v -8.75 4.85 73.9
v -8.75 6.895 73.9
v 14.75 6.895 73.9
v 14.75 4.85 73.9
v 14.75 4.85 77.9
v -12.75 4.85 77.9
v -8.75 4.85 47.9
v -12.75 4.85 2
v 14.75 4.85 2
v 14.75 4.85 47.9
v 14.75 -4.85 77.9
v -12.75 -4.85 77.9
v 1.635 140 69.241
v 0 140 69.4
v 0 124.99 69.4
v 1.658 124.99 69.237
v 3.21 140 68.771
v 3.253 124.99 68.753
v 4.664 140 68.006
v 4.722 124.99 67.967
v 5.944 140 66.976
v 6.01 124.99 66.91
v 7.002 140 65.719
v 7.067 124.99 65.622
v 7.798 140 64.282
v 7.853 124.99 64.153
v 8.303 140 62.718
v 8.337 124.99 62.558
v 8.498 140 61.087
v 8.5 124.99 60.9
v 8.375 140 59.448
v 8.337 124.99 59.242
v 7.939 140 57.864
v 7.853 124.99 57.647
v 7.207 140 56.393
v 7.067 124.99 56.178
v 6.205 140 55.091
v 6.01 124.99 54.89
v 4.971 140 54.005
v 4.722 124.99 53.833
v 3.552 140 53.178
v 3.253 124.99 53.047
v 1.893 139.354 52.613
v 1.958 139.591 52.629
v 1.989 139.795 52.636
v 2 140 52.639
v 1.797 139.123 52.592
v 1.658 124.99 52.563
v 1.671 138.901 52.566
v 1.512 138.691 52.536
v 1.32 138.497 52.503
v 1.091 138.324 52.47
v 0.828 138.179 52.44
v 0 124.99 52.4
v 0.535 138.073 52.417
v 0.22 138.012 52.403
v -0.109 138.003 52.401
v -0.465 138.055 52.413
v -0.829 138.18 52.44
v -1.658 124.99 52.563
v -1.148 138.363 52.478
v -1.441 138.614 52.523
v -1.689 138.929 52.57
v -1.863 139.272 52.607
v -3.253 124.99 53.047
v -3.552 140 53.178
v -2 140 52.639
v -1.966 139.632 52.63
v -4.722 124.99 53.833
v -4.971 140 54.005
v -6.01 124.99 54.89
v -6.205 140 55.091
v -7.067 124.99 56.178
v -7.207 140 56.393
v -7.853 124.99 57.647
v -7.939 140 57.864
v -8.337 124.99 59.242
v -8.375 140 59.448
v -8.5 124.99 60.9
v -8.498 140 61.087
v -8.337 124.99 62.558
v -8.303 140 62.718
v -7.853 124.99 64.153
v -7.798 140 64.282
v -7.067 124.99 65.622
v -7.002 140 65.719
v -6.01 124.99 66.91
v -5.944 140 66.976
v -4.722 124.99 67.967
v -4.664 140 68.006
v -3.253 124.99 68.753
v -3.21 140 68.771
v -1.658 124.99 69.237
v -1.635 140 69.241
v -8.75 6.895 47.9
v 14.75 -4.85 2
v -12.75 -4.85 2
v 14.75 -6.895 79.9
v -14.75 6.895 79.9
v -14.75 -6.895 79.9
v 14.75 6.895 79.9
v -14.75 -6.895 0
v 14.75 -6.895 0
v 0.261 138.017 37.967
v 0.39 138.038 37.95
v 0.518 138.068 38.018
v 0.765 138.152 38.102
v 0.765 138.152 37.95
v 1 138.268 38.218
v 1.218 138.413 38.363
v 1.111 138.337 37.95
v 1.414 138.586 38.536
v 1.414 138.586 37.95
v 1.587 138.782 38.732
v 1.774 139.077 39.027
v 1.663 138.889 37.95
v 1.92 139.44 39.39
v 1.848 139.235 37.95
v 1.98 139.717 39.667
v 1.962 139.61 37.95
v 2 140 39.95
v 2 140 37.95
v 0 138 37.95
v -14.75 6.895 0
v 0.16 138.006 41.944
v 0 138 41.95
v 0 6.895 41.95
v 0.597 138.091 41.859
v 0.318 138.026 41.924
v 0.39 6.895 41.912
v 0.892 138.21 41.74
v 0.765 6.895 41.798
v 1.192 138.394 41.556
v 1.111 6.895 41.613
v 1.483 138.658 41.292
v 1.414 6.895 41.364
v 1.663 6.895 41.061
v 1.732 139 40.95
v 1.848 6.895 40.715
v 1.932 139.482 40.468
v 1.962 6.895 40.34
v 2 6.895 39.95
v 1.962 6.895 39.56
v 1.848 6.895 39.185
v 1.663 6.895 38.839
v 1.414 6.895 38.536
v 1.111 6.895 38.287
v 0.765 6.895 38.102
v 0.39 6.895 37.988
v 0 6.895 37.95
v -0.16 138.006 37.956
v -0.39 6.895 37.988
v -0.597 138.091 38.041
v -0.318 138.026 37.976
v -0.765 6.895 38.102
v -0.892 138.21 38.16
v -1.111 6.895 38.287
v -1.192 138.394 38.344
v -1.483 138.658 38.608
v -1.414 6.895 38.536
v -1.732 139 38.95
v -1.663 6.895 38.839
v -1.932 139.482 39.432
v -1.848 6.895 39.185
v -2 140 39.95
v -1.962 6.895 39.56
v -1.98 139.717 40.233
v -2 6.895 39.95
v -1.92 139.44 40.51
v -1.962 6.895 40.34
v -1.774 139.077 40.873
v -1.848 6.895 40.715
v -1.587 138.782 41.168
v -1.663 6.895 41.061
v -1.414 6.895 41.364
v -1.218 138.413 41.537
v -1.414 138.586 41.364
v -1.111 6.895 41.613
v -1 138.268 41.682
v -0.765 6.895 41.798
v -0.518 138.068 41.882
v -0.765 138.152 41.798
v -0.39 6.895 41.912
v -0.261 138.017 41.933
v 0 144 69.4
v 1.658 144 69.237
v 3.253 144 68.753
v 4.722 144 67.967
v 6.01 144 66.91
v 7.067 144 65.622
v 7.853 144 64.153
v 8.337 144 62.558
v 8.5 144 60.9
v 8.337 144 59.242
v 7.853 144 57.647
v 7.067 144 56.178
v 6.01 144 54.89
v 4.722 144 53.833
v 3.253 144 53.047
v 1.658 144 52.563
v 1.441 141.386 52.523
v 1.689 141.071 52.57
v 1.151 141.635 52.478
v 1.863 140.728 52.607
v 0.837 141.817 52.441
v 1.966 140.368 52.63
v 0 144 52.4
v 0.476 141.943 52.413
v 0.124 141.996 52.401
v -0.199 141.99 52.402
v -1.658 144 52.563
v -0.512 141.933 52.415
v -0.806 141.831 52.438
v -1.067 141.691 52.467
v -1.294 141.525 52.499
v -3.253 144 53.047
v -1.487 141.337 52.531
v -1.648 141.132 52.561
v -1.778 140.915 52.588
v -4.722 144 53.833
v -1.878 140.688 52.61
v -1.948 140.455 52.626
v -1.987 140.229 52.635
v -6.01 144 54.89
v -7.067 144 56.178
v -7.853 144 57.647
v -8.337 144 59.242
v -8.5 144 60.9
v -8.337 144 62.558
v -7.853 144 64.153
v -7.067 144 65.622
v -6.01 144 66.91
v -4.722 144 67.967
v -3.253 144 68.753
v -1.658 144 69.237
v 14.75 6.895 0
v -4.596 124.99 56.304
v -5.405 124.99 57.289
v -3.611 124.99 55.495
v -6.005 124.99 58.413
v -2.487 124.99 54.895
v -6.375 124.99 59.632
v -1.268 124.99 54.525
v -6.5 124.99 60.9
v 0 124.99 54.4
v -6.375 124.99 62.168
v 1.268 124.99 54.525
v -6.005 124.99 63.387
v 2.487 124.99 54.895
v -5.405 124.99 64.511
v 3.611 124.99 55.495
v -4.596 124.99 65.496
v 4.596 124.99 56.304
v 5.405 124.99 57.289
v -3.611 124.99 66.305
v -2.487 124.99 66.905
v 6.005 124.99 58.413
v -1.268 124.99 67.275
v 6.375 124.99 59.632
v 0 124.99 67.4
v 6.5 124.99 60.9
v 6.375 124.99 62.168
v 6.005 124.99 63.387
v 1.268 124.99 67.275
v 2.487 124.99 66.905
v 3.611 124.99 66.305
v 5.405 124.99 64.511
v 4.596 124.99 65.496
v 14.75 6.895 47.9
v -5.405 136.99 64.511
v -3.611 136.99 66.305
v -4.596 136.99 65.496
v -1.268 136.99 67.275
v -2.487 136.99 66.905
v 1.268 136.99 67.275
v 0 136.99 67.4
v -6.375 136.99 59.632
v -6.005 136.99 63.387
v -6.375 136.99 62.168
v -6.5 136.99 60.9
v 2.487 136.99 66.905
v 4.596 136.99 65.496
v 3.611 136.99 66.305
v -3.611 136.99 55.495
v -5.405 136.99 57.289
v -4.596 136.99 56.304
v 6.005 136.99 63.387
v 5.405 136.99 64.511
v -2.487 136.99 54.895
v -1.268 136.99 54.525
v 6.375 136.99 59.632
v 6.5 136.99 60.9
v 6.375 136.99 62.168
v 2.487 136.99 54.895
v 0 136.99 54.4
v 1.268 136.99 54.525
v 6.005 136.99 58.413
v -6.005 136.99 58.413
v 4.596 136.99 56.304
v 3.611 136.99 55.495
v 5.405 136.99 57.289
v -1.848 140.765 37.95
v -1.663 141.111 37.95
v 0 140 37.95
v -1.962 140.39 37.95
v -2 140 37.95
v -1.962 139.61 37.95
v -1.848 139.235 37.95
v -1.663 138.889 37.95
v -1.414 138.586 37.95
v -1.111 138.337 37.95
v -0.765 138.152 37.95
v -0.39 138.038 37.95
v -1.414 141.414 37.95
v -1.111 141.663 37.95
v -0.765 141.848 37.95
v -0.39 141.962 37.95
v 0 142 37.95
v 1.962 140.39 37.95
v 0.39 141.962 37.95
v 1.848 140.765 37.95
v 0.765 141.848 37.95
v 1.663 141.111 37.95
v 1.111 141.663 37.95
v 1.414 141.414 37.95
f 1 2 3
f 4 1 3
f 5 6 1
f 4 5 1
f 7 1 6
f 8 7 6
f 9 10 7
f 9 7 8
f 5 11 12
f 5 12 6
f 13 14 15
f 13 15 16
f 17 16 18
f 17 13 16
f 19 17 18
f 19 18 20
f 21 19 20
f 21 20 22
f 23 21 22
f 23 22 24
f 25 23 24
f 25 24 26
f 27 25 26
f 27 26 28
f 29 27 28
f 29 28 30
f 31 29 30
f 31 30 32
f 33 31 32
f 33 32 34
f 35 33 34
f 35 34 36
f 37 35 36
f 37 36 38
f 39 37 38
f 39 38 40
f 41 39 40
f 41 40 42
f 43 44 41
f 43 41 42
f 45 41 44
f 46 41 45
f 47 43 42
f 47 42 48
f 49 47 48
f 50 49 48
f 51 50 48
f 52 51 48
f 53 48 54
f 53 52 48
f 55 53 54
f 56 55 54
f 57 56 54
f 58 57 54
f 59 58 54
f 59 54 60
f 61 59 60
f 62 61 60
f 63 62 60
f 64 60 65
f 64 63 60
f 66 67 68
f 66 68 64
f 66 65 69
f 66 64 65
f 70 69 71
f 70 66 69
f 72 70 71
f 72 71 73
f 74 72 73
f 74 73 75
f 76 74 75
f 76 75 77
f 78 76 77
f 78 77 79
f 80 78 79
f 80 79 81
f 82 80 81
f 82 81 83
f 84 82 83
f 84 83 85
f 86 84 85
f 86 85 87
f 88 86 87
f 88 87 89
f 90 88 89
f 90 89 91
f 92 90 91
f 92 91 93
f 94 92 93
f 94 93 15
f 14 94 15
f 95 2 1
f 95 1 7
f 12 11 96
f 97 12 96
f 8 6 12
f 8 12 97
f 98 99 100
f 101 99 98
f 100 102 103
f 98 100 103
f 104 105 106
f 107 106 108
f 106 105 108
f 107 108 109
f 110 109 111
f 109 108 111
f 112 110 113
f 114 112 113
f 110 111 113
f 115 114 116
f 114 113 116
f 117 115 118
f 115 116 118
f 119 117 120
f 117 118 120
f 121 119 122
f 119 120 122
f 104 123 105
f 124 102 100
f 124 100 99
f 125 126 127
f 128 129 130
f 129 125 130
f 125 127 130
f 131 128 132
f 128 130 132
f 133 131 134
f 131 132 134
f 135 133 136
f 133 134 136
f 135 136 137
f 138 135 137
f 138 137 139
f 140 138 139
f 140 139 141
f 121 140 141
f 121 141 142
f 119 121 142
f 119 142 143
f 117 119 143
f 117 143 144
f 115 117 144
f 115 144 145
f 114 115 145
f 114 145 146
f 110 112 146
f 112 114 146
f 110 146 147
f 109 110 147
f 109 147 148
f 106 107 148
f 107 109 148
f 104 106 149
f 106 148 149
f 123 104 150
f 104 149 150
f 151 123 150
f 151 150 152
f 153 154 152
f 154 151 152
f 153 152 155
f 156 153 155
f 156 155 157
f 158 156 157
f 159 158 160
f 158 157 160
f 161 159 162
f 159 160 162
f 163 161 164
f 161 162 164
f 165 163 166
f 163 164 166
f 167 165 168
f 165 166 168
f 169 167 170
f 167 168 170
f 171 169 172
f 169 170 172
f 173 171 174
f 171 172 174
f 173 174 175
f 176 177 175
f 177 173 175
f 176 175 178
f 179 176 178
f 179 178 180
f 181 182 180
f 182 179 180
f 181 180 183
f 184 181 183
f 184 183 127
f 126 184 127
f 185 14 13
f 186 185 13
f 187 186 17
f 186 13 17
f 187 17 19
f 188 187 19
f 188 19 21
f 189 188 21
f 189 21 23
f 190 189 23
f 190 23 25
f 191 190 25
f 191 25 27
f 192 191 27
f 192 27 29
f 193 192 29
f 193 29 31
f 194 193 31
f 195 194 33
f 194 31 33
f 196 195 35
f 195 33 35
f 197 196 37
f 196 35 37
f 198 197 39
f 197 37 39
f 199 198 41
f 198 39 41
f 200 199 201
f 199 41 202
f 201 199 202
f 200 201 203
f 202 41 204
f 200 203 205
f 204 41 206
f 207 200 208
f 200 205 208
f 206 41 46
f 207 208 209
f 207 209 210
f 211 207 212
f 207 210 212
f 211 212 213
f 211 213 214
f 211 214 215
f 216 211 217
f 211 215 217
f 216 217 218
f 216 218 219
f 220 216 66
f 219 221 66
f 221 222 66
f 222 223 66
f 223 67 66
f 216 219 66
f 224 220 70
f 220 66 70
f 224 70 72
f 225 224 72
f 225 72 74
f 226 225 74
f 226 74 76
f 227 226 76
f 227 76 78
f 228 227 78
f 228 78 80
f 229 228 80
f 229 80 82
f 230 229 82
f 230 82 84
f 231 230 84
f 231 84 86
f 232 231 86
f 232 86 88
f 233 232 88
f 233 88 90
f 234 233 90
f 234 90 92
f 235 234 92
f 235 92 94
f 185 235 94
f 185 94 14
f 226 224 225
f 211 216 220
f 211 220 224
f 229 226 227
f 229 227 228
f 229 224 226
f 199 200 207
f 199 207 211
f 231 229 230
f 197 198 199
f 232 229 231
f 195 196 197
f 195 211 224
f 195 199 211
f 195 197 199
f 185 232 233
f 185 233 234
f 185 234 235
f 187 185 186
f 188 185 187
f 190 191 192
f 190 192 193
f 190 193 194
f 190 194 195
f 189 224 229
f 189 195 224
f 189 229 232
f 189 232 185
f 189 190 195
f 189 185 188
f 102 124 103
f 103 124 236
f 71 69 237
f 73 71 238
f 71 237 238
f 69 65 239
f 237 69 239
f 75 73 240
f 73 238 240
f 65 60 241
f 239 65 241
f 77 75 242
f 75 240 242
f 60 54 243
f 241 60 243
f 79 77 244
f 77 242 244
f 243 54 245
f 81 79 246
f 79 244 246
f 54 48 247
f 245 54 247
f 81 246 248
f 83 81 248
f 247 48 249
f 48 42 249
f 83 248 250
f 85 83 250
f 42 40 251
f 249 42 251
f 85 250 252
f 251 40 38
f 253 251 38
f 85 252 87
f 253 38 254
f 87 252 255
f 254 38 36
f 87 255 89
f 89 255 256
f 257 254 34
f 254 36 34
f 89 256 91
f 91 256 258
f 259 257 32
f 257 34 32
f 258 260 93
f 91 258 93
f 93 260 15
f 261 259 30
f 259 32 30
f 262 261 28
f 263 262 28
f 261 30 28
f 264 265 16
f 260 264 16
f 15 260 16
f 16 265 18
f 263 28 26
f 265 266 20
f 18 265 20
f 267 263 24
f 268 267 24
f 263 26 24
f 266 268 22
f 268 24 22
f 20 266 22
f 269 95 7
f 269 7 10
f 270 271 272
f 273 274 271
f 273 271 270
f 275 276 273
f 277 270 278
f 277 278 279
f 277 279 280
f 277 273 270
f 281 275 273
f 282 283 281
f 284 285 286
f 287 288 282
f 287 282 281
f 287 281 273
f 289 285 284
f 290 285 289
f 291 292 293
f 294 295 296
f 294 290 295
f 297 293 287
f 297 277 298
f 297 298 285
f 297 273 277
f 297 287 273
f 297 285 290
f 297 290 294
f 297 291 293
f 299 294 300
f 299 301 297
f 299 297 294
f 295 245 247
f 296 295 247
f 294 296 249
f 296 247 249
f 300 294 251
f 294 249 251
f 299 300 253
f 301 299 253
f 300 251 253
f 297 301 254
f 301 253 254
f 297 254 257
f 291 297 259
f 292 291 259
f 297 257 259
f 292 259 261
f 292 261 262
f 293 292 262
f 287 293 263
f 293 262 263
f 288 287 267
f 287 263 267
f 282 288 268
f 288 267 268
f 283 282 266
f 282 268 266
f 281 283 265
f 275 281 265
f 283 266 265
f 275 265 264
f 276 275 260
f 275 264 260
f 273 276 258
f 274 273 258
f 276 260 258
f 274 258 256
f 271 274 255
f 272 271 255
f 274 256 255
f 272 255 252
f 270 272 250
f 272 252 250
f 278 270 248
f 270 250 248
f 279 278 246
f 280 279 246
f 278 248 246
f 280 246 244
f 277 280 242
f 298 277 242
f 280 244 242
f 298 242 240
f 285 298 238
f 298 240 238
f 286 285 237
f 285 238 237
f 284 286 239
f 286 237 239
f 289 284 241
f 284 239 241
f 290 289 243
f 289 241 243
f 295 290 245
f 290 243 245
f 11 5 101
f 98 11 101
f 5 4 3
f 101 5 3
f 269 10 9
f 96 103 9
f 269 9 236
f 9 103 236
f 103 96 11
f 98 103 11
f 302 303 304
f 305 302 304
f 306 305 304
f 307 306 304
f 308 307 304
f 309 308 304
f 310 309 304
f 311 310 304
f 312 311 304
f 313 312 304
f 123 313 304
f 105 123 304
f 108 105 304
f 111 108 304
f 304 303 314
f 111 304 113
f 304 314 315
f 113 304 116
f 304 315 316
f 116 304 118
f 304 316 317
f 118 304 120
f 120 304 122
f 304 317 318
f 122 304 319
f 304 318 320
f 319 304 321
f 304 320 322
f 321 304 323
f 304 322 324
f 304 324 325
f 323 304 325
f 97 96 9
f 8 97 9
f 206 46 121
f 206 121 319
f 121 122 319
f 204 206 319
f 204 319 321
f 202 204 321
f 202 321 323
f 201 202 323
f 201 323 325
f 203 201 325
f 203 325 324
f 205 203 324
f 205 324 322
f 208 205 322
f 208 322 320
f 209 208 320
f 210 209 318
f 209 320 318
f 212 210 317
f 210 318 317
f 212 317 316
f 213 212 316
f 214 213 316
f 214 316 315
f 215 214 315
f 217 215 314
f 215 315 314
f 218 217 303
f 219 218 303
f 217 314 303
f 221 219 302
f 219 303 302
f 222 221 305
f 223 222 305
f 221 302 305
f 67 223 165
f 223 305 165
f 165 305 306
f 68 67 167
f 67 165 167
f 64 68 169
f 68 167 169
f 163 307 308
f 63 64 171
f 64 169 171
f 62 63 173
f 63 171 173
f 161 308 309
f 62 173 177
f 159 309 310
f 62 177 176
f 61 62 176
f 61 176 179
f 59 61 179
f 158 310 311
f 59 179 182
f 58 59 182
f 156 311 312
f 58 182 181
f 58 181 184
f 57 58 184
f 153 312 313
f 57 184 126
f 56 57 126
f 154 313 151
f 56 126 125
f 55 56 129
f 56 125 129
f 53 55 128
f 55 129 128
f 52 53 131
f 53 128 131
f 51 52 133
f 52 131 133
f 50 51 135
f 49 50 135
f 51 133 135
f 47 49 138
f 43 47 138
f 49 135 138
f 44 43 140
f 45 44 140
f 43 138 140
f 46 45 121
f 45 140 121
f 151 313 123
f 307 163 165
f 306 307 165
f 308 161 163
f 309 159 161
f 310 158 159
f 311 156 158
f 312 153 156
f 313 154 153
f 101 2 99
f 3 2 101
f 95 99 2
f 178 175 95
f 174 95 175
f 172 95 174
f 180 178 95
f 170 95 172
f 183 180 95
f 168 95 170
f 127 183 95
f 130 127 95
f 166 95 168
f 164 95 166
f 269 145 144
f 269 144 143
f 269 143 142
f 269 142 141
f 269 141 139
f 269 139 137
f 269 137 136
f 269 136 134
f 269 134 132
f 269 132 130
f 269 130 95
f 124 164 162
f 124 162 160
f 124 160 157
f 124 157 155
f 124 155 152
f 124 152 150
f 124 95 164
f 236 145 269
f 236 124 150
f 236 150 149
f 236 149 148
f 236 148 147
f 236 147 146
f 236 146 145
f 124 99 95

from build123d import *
from build123d.topology import SkipClean

# Parameters (mm, degrees)
SKETCH4_R           = 2
BOSS_EXTRUDE1_DEPTH = 140
SKETCH5_W           = 29.5
SKETCH5_H           = 13.79
BOSS_EXTRUDE3_DEPTH = 79.9
SKETCH6_W           = 75.9
SKETCH6_H           = 9.7
CUT_EXTRUDE1_DEPTH  = 27.5
SKETCH7_W           = 23.5
SKETCH7_H           = 26
CUT_EXTRUDE2_DEPTH  = 3
SKETCH8_R           = 2
BOSS_EXTRUDE4_DEPTH = 22.95
SKETCH12_R          = 8.5
BOSS_EXTRUDE6_DEPTH = 15.01
SKETCH13_R          = 8.5
BOSS_EXTRUDE7_DEPTH = 4
SKETCH14_R          = 6.5
CUT_EXTRUDE3_DEPTH  = 12


with BuildPart() as part:
    # Sketch4 → Boss-Extrude1 (new body)
    with BuildSketch(Plane(origin=(0, 0, 0), x_dir=(1, 0, 0), z_dir=(0, 1, 0))):
        with Locations(Location((0, -39.95, 0), (0, 0, 270))):
            Circle(SKETCH4_R)
    extrude(amount=BOSS_EXTRUDE1_DEPTH)

    # Sketch5 → Boss-Extrude3 (add)
    with BuildSketch(Plane.XY):
        Rectangle(SKETCH5_W, SKETCH5_H)
    extrude(amount=BOSS_EXTRUDE3_DEPTH)

    # Sketch6 → Cut-Extrude1 (cut)
    with BuildSketch(Plane(origin=(14.75, 0, 0), x_dir=(0, 0, -1), z_dir=(1, 0, 0))):
        with Locations((-39.95, 0)):
            Rectangle(SKETCH6_W, SKETCH6_H)
    extrude(amount=-CUT_EXTRUDE1_DEPTH, mode=Mode.SUBTRACT)

    # Sketch7 → Cut-Extrude2 (cut)
    with BuildSketch(Plane(origin=(0, 6.895, 0), x_dir=(1, 0, 0), z_dir=(0, 1, 0))):
        with Locations((3, -60.9)):
            Rectangle(SKETCH7_W, SKETCH7_H)
    extrude(amount=-CUT_EXTRUDE2_DEPTH, mode=Mode.SUBTRACT)

    # Sketch8 → Boss-Extrude4 (add)
    with SkipClean():  # the faces are left unmerged after this step: merging them gives an invalid solid
        with BuildSketch(Plane.XY.offset(37.95)):
            with Locations((0, 140)):
                Circle(SKETCH8_R)
        extrude(amount=BOSS_EXTRUDE4_DEPTH)

    # Sketch12 → Boss-Extrude6 (add)
    with SkipClean():  # the faces are left unmerged after this step: merging them gives an invalid solid
        with BuildSketch(Plane(origin=(0, 140, 0), x_dir=(1, 0, 0), z_dir=(0, 1, 0))):
            with Locations(Location((0, -60.9, 0), (0, 0, 270))):
                Circle(SKETCH12_R)
        extrude(amount=-BOSS_EXTRUDE6_DEPTH)

    # Sketch13 → Boss-Extrude7 (add)
    with SkipClean():  # the faces are left unmerged after this step: merging them gives an invalid solid
        with BuildSketch(Plane(origin=(0, 140, 0), x_dir=(1, 0, 0), z_dir=(0, 1, 0))):
            with Locations(Location((0, -60.9, 0), (0, 0, 270))):
                Circle(SKETCH13_R)
        extrude(amount=BOSS_EXTRUDE7_DEPTH)

    # Sketch14 → Cut-Extrude3 (cut)
    with SkipClean():  # the faces are left unmerged after this step: merging them gives an invalid solid
        with BuildSketch(Plane.XZ.offset(-124.99)):
            with Locations(Location((0, 60.9, 0), (0, 0, 270))):
                Circle(SKETCH14_R)
        extrude(amount=-CUT_EXTRUDE3_DEPTH, mode=Mode.SUBTRACT)


solid = part.part
